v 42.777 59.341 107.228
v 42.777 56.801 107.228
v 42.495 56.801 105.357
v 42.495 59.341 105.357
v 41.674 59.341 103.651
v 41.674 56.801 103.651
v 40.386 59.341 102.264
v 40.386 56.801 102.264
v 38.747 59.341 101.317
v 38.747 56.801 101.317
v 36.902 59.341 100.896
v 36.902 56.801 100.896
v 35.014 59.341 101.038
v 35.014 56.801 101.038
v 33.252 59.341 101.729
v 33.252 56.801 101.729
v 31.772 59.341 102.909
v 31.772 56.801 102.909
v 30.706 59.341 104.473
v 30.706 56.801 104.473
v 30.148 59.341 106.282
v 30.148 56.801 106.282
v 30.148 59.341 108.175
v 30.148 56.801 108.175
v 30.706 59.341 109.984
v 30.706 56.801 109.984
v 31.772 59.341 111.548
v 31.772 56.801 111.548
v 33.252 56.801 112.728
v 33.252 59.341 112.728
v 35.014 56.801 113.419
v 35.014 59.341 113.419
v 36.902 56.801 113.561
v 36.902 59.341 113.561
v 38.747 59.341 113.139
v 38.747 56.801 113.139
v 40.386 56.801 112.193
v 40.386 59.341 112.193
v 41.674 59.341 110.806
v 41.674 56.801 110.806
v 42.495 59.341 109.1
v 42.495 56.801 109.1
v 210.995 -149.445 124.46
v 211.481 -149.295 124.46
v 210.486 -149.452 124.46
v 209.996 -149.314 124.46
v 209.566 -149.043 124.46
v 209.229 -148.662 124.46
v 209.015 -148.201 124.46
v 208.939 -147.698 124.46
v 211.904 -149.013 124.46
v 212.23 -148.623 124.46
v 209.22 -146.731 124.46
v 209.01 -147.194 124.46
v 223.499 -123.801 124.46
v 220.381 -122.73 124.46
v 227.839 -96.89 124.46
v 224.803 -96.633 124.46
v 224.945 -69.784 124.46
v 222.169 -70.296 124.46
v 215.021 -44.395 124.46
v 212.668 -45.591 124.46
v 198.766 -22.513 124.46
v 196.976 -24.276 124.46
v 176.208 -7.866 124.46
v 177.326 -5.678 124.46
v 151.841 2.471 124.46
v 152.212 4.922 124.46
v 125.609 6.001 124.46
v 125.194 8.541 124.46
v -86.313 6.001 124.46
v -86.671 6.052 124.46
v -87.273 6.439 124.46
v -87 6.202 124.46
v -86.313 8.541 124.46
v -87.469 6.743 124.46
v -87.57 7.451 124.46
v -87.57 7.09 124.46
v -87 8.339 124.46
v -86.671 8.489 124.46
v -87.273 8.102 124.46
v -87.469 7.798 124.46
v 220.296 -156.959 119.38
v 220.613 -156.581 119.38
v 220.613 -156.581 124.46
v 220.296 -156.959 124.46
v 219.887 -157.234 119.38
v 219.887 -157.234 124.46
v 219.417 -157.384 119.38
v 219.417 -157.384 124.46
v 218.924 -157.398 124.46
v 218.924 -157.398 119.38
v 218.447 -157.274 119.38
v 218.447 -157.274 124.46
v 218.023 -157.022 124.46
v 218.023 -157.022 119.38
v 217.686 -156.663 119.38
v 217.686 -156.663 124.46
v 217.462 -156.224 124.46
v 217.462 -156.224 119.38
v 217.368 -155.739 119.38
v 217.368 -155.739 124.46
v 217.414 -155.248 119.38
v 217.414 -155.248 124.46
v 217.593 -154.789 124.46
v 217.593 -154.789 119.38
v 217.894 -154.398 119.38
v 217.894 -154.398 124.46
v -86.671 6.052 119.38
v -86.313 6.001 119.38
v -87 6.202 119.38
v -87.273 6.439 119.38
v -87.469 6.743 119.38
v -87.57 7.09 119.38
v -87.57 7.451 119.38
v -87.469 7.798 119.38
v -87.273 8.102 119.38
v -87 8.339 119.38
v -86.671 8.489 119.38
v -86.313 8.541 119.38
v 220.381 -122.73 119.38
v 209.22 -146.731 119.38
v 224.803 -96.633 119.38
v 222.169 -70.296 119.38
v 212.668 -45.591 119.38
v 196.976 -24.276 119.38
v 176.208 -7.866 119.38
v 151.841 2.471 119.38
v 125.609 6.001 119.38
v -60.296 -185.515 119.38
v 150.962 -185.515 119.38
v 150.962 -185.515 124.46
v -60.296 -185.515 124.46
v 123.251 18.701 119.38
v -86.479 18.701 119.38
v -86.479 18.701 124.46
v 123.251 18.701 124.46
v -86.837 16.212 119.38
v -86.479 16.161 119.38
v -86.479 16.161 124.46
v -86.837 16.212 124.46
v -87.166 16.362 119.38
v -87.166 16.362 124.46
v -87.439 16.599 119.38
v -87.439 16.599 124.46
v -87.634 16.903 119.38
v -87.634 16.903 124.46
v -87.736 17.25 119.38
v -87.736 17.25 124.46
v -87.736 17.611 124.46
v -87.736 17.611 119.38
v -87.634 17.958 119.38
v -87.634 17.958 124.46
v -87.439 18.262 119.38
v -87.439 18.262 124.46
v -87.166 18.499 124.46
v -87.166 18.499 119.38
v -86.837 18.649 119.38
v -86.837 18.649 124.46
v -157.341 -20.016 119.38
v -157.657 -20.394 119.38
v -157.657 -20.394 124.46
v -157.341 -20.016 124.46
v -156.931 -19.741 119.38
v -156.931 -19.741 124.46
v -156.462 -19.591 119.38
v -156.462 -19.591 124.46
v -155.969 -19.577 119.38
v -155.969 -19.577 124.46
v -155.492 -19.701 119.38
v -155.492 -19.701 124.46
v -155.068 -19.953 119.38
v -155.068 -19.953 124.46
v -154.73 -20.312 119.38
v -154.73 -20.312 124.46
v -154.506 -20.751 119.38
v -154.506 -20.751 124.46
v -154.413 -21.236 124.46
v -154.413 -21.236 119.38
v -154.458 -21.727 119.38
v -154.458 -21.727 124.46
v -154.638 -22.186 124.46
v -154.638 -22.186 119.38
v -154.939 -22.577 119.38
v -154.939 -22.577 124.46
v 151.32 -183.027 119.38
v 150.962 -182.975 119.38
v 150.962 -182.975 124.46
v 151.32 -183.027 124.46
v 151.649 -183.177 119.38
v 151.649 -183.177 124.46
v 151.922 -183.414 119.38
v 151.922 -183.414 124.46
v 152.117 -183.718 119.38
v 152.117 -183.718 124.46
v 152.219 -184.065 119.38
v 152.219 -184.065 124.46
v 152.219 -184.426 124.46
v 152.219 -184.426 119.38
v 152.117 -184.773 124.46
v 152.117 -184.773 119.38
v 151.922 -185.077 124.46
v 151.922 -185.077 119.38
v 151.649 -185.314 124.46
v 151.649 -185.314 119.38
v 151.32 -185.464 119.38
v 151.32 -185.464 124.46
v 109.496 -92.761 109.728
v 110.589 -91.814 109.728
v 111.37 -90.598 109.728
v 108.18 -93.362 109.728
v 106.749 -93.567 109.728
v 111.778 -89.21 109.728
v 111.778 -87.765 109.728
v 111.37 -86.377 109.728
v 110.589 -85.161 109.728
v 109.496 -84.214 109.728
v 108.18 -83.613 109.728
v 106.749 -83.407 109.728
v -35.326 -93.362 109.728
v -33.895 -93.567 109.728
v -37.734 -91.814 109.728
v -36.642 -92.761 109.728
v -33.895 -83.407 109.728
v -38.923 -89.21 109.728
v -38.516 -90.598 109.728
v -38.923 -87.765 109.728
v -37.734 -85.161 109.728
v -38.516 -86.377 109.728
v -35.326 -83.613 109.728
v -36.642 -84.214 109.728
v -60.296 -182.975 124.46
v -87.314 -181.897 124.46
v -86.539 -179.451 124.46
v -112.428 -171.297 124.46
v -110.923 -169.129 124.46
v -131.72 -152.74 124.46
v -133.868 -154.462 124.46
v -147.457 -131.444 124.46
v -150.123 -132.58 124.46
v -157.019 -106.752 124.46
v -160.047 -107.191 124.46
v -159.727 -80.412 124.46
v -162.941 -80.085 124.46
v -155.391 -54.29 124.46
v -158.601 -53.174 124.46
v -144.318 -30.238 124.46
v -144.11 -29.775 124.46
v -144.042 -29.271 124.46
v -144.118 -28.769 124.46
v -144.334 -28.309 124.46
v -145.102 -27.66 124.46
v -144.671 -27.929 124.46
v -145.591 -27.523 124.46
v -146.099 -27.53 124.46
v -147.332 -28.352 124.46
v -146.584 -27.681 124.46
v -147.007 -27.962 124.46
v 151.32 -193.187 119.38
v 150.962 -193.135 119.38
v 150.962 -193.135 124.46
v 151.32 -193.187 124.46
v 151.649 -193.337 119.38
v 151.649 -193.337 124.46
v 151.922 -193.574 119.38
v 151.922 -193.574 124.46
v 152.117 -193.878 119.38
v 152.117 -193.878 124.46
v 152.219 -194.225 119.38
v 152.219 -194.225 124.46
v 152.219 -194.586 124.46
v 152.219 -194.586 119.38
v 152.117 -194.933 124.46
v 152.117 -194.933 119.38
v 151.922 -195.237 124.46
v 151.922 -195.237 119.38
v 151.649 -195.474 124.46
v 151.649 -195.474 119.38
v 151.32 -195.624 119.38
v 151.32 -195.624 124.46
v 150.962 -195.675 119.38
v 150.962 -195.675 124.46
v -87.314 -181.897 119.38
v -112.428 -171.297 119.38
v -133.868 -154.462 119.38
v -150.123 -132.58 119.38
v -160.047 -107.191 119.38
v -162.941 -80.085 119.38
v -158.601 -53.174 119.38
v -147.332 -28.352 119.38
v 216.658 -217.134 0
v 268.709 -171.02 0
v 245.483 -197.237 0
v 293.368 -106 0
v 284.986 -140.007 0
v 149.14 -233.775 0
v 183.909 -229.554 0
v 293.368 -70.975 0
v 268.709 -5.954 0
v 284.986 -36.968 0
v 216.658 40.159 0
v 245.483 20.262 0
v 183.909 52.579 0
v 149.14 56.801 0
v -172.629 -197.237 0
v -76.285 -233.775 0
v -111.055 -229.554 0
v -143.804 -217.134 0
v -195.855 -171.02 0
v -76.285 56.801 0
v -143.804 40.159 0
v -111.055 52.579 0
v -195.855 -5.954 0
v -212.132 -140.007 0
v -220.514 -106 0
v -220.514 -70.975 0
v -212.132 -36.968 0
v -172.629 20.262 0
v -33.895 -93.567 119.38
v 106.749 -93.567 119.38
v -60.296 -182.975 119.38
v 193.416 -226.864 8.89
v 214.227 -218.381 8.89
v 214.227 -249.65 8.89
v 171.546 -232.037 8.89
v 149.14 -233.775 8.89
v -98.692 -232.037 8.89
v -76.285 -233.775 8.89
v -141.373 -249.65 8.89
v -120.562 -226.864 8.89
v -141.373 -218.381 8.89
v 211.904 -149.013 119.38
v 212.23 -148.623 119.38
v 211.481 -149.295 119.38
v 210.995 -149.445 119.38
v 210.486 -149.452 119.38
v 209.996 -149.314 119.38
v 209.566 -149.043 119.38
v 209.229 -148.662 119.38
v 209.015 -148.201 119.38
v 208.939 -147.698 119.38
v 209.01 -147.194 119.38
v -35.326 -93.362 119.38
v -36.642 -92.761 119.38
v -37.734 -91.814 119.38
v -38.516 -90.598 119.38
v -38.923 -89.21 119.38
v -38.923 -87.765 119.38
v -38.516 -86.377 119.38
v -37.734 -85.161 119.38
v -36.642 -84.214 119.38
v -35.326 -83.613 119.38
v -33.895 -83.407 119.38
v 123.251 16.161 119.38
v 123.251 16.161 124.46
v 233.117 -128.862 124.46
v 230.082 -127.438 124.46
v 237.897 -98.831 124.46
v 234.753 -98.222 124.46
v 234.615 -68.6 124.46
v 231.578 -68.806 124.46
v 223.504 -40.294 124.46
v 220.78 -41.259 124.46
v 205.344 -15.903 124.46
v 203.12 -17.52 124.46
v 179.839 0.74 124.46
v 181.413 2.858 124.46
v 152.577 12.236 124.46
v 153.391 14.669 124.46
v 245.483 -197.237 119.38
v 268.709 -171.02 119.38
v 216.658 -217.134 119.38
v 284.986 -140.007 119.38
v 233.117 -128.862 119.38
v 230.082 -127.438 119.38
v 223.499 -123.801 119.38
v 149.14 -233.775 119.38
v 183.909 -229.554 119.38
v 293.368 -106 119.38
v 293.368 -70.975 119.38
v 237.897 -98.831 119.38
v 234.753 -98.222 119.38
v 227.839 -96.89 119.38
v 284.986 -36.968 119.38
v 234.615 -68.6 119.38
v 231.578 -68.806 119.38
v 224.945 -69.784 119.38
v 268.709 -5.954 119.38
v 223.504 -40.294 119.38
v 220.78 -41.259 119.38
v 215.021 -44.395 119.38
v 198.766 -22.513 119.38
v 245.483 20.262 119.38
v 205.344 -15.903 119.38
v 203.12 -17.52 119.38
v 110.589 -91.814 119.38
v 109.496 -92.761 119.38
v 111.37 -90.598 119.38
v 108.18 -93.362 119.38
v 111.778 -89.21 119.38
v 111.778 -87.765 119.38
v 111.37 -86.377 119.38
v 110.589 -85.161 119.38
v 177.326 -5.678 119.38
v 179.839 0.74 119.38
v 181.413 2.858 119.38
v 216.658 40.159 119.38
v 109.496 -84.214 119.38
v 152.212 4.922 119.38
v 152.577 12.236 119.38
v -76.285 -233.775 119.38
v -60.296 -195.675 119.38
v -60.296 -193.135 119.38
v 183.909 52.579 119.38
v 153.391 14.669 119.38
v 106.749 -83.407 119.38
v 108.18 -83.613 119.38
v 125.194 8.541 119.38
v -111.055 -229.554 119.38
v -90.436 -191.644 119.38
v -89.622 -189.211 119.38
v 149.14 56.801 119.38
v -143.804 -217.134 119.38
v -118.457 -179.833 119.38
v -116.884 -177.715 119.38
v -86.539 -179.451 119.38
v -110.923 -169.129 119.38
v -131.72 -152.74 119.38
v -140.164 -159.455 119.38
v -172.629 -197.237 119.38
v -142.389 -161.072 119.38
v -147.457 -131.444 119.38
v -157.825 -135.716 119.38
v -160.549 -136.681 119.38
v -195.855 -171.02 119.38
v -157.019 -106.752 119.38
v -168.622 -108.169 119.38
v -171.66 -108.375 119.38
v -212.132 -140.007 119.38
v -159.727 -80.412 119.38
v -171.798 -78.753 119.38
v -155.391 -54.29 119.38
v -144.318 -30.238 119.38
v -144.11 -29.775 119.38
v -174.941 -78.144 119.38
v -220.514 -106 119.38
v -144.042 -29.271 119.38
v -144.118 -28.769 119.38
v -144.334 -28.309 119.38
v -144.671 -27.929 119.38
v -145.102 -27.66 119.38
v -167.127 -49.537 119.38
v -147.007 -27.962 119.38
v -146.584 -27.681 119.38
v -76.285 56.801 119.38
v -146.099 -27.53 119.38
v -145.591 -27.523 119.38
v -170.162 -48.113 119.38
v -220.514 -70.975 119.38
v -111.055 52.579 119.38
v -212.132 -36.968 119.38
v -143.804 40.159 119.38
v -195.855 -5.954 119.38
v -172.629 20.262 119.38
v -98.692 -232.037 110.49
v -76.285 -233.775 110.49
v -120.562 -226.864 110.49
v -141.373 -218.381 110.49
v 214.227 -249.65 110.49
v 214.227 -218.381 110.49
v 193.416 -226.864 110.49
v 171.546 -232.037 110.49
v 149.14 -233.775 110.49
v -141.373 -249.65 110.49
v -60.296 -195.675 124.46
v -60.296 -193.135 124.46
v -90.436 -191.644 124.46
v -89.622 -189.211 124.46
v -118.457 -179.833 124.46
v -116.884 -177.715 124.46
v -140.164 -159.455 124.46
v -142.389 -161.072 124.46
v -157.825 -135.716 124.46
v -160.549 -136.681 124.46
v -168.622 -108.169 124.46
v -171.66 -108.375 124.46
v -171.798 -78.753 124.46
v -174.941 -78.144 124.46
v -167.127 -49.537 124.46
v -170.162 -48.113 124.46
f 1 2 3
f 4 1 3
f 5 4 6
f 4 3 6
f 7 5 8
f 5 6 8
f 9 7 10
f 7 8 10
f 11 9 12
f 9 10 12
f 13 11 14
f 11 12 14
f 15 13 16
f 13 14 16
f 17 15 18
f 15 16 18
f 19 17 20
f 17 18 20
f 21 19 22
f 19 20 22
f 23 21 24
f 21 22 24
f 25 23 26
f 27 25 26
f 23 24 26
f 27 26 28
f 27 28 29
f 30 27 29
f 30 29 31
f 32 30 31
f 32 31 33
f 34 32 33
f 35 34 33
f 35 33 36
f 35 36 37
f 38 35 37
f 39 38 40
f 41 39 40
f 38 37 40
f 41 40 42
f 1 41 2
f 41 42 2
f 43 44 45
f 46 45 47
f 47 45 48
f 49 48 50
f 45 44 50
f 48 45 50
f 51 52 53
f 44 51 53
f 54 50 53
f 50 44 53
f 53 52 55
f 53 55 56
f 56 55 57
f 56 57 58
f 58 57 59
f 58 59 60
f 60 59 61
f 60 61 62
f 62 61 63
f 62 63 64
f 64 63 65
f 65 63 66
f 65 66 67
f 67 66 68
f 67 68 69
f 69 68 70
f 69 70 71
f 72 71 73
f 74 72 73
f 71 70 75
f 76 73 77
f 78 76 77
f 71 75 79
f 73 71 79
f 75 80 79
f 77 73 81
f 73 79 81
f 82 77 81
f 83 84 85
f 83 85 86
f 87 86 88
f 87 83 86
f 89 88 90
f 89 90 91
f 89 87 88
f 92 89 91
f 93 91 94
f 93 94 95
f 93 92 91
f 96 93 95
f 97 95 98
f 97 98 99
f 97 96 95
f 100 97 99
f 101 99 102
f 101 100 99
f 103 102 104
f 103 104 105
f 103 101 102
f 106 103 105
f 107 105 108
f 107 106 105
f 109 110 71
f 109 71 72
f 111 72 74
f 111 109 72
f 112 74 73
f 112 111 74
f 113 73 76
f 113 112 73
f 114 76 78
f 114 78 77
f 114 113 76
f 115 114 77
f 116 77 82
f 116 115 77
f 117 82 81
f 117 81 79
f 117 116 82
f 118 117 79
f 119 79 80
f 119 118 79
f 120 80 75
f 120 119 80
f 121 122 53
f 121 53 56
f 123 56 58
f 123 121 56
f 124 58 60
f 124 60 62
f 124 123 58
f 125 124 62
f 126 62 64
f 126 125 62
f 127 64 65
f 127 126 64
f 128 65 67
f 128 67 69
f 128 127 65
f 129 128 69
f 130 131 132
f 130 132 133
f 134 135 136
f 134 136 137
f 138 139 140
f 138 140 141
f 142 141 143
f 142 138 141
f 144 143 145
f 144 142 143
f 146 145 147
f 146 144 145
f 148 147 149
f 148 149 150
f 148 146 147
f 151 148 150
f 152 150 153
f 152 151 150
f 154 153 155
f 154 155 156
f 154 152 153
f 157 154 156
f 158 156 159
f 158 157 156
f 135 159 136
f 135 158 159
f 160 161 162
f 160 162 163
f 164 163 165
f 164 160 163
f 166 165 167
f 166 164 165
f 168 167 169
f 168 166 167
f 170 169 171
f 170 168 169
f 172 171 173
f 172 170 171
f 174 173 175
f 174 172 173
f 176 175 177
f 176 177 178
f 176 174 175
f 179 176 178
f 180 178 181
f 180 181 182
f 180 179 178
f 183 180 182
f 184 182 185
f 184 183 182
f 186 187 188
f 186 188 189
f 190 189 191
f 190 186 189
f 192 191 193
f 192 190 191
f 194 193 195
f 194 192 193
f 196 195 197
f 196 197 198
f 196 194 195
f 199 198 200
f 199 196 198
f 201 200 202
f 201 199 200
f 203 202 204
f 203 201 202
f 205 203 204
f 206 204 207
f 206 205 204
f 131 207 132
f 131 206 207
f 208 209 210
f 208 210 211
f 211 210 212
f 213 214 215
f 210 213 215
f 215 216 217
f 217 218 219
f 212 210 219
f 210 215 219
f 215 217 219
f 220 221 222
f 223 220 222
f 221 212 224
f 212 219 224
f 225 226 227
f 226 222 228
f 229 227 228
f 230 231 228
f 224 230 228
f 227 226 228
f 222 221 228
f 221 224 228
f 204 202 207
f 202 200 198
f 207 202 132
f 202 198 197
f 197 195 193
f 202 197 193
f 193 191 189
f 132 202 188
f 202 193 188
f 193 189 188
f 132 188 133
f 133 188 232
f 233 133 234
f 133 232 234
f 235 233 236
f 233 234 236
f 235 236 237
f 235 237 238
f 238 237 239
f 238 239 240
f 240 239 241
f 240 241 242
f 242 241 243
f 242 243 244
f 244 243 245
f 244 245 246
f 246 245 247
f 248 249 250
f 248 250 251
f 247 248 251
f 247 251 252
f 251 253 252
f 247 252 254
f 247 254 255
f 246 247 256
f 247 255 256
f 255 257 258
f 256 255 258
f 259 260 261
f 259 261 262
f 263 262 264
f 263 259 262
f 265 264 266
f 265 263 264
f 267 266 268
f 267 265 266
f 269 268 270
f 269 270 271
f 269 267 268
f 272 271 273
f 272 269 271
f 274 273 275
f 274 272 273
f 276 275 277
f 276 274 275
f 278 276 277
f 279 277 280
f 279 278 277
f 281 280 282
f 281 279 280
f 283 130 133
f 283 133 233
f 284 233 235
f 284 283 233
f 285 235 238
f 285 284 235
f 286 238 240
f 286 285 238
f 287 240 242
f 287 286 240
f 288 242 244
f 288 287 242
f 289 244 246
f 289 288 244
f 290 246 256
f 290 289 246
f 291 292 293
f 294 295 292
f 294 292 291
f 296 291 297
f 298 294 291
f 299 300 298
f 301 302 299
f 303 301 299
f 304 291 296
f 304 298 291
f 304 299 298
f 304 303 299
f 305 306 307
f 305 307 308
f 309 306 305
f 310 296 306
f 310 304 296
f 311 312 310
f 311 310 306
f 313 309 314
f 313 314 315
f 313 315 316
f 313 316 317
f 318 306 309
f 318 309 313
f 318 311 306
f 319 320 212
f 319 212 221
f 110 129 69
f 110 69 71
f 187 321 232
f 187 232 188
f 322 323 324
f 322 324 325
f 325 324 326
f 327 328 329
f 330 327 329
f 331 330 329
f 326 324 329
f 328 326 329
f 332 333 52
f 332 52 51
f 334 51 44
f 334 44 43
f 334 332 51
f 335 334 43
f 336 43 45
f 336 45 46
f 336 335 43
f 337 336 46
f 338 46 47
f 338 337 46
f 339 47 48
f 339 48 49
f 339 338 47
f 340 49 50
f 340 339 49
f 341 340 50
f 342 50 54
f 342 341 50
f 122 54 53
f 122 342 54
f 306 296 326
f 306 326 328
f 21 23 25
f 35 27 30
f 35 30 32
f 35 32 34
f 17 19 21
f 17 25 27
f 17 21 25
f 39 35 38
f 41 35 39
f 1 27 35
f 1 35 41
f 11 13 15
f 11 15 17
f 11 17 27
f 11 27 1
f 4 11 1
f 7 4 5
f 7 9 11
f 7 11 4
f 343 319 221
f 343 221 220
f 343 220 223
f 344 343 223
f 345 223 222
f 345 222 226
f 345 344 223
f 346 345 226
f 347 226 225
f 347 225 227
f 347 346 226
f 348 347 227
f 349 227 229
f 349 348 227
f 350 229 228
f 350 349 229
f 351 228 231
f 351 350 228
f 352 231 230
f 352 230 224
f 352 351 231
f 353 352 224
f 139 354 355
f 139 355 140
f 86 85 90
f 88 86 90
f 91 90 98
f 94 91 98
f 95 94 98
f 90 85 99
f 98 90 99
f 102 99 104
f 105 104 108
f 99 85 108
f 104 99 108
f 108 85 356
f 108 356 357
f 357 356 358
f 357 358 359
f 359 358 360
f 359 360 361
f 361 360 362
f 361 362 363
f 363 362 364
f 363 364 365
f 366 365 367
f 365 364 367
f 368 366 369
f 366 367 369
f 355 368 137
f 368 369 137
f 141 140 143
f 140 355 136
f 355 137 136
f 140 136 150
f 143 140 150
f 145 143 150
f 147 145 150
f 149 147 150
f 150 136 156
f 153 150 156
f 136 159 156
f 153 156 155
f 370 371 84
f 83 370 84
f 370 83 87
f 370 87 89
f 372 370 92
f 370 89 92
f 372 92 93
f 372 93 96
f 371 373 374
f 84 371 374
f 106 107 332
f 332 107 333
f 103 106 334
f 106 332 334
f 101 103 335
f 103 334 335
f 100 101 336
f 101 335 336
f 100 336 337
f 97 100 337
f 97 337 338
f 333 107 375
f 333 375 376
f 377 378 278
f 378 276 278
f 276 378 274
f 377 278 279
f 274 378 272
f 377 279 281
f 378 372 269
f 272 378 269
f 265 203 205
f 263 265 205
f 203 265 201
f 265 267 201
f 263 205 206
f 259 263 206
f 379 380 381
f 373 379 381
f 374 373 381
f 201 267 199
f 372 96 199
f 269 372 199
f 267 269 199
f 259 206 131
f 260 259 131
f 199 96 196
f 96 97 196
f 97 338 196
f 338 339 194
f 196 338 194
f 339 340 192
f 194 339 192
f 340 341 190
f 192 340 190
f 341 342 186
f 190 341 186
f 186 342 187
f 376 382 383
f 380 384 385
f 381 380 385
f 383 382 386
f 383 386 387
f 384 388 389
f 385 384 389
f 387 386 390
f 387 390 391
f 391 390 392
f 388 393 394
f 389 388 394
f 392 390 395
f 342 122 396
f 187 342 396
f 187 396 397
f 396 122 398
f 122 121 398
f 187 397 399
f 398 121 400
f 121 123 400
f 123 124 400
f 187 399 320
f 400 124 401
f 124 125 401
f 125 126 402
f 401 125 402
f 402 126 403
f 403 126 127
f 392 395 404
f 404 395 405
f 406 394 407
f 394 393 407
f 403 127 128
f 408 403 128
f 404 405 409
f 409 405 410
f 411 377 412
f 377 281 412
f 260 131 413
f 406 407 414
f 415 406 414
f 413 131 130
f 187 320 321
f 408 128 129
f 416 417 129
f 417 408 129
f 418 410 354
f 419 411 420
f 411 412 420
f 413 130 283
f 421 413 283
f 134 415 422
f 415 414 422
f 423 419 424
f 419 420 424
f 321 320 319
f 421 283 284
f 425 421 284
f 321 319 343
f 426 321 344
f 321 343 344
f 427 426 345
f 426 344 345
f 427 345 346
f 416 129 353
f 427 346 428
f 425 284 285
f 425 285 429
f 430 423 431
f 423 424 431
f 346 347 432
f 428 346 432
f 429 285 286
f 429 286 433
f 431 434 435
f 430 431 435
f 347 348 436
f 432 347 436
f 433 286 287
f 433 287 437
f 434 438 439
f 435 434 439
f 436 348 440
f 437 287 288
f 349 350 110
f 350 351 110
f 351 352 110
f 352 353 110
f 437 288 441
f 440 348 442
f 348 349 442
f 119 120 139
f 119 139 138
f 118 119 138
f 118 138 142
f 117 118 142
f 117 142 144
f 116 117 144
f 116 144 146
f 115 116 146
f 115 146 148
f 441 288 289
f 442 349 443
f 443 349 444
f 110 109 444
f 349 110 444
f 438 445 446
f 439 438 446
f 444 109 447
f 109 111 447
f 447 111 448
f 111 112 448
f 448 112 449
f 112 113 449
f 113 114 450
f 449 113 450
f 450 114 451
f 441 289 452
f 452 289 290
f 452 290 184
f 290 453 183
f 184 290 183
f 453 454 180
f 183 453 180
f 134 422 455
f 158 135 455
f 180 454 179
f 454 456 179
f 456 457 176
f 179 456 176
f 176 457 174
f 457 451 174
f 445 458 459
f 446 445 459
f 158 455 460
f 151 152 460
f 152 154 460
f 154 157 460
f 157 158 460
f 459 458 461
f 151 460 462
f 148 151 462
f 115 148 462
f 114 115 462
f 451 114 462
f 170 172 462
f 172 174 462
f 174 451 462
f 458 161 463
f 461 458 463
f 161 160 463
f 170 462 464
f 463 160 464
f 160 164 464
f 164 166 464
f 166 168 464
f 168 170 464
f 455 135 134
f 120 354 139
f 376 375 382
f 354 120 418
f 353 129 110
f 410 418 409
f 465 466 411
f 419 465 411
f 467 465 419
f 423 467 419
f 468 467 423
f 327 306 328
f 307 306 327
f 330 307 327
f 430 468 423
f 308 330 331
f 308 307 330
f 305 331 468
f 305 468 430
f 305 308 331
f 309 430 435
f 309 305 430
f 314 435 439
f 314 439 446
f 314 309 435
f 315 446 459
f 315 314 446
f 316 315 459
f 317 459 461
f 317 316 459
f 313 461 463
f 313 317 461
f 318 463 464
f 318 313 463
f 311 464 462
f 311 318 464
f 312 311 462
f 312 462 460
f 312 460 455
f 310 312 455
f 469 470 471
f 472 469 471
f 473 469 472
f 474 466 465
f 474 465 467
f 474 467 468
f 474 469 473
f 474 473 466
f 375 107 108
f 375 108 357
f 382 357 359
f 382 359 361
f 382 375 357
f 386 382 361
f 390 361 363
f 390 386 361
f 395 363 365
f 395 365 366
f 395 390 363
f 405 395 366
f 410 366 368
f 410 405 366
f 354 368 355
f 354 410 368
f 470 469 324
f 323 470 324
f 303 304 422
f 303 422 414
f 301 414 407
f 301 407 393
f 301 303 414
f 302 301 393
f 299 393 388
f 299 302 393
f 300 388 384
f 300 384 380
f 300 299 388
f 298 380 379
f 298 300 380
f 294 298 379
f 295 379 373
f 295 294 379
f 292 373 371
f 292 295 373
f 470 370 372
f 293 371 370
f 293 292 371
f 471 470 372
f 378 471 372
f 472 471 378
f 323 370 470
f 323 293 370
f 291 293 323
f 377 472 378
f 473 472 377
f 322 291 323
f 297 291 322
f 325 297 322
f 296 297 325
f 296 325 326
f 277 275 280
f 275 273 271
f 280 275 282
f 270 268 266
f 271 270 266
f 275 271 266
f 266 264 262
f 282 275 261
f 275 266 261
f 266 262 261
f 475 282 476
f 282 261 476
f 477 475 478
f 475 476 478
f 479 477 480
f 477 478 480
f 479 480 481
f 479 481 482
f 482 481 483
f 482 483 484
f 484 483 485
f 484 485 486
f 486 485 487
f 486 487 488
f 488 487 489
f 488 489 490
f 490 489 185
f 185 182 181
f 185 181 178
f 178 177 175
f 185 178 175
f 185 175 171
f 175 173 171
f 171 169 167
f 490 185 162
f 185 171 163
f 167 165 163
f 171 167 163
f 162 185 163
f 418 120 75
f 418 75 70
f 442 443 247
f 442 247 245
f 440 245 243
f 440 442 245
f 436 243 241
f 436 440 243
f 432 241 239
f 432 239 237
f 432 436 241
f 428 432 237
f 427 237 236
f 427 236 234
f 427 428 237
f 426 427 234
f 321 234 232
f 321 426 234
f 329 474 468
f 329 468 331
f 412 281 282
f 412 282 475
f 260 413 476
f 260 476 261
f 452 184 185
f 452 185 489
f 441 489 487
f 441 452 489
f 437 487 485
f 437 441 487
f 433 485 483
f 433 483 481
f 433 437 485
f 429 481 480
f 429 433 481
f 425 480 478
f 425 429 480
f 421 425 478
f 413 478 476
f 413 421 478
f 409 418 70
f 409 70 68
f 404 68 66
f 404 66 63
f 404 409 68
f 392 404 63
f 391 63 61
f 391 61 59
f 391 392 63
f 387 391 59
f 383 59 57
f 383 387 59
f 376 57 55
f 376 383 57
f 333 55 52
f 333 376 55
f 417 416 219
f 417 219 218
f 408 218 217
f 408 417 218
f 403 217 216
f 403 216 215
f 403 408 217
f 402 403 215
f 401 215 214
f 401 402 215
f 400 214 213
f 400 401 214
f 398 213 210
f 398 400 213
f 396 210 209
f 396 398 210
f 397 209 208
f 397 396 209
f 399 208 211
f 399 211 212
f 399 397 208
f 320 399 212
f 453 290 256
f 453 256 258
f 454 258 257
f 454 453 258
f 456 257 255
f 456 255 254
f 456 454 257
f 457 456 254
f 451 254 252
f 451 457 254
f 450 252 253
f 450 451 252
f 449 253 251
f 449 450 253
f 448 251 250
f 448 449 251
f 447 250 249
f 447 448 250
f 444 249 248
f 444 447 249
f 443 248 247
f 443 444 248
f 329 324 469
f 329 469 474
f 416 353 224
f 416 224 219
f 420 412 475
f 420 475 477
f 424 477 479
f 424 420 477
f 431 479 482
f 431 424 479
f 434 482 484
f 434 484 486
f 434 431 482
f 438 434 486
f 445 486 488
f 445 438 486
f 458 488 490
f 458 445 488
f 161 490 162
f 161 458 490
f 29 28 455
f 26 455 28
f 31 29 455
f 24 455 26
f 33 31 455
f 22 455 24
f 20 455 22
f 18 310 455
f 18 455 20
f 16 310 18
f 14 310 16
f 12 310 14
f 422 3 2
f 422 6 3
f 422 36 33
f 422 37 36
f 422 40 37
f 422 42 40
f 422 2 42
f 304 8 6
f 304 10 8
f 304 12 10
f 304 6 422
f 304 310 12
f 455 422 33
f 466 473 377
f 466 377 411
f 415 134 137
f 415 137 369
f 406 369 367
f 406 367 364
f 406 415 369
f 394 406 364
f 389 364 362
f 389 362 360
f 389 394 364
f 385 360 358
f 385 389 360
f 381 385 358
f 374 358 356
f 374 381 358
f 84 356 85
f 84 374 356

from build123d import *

# Parameters (mm, degrees)
BOSS_EXTRUDE1_DEPTH = 119.38
SKETCH2_W           = 355.6
SKETCH2_H           = 101.6
BOSS_EXTRUDE2_DEPTH = 44.958
CUT_EXTRUDE1_DEPTH  = 9.652
SKETCH4_R           = 6.35
BOSS_EXTRUDE3_DEPTH = 2.54
BOSS_EXTRUDE4_DEPTH = 5.08


with BuildPart() as part:
    # Sketch1 → Boss-Extrude1 (new body)
    with BuildSketch(Plane.XY):
        with BuildLine():
            Line((-76.285439921, 56.800521538), (149.139560079, 56.800521538))
            ThreePointArc((149.139560079, 56.800521538), (294.427560079, -88.487478462), (149.139560079, -233.775478462))
            Line((149.139560079, -233.775478462), (-76.285439921, -233.775478462))
            ThreePointArc((-76.285439921, -233.775478462), (-221.573439921, -88.487478462), (-76.285439921, 56.800521538))
        make_face()
    extrude(amount=BOSS_EXTRUDE1_DEPTH)

    # Sketch2 → Boss-Extrude2 (add)
    with BuildSketch(Plane(origin=(0, -249.650478462, 0), x_dir=(-1, 0, 0), z_dir=(0, -1, 0))):
        with Locations((-36.427060079, -59.69)):
            Rectangle(SKETCH2_W, SKETCH2_H)
    extrude(amount=-BOSS_EXTRUDE2_DEPTH)

    # Sketch3 → Cut-Extrude1 (cut)
    with BuildSketch(Plane.XY.offset(119.38)):
        with BuildLine():
            Line((-33.895177701, -83.407478462), (106.749297859, -83.407478462))
            ThreePointArc((106.749297859, -83.407478462), (111.829297859, -88.487478462), (106.749297859, -93.567478462))
            Line((106.749297859, -93.567478462), (-33.895177701, -93.567478462))
            ThreePointArc((-33.895177701, -93.567478462), (-38.975177701, -88.487478462), (-33.895177701, -83.407478462))
        make_face()
    extrude(amount=-CUT_EXTRUDE1_DEPTH, mode=Mode.SUBTRACT)

    # Sketch4 → Boss-Extrude3 (add)
    with BuildSketch(Plane(origin=(0, 56.800521538, 0), x_dir=(1, 0, 0), z_dir=(0, 1, 0))):
        with Locations((36.427060079, -107.228428284)):
            Circle(SKETCH4_R)
    extrude(amount=BOSS_EXTRUDE3_DEPTH)

    # Sketch5 → Boss-Extrude4 (add)
    with BuildSketch(Plane.XY.offset(119.38)):
        with BuildLine():
            Line((-86.479093302, 18.700521538), (123.251136742, 18.700521538))
            ThreePointArc((123.251136742, 18.700521538), (223.504350955, -40.293834211), (220.612604828, -156.580887552))
            ThreePointArc((220.612604828, -156.580887552), (218.022957646, -157.022271916), (217.893868774, -154.398452419))
            ThreePointArc((217.893868774, -154.398452419), (220.780120028, -41.258888911), (123.251136742, 16.160521538))
            Line((123.251136742, 16.160521538), (-86.479093302, 16.160521538))
            ThreePointArc((-86.479093302, 16.160521538), (-87.749093302, 17.430521538), (-86.479093302, 18.700521538))
        make_face()
        with BuildLine():
            Line((-86.313359517, 8.540521538), (125.193739137, 8.540521538))
            ThreePointArc((125.193739137, 8.540521538), (215.020934696, -44.395432513), (212.23038132, -148.622843039))
            ThreePointArc((212.23038132, -148.622843039), (209.771349214, -149.194111608), (209.219629388, -146.730619796))
            ThreePointArc((209.219629388, -146.730619796), (212.668390329, -45.591104409), (125.608642701, 6.000521538))
            Line((125.608642701, 6.000521538), (-86.313359517, 6.000521538))
            ThreePointArc((-86.313359517, 6.000521538), (-87.583359517, 7.270521538), (-86.313359517, 8.540521538))
        make_face()
        with BuildLine():
            Line((150.962085254, -185.515478462), (-60.295843622, -185.515478462))
            ThreePointArc((-60.295843622, -185.515478462), (-150.123039181, -132.579524411), (-147.332485805, -28.352113885))
            ThreePointArc((-147.332485805, -28.352113885), (-144.876543413, -27.778907884), (-144.317816359, -30.238184654))
            ThreePointArc((-144.317816359, -30.238184654), (-147.45714929, -131.444373213), (-60.295843622, -182.975478462))
            Line((-60.295843622, -182.975478462), (150.962085254, -182.975478462))
            ThreePointArc((150.962085254, -182.975478462), (152.232085254, -184.245478462), (150.962085254, -185.515478462))
        make_face()
        with BuildLine():
            Line((150.962085254, -195.675478462), (-60.295843622, -195.675478462))
            ThreePointArc((-60.295843622, -195.675478462), (-160.549057836, -136.681122713), (-157.657311709, -20.394069372))
            ThreePointArc((-157.657311709, -20.394069372), (-155.067664526, -19.952685009), (-154.938575654, -22.576504505))
            ThreePointArc((-154.938575654, -22.576504505), (-157.824826909, -135.716068014), (-60.295843622, -193.135478462))
            Line((-60.295843622, -193.135478462), (150.962085254, -193.135478462))
            ThreePointArc((150.962085254, -193.135478462), (152.232085254, -194.405478462), (150.962085254, -195.675478462))
        make_face()
    extrude(amount=BOSS_EXTRUDE4_DEPTH)


solid = part.part
